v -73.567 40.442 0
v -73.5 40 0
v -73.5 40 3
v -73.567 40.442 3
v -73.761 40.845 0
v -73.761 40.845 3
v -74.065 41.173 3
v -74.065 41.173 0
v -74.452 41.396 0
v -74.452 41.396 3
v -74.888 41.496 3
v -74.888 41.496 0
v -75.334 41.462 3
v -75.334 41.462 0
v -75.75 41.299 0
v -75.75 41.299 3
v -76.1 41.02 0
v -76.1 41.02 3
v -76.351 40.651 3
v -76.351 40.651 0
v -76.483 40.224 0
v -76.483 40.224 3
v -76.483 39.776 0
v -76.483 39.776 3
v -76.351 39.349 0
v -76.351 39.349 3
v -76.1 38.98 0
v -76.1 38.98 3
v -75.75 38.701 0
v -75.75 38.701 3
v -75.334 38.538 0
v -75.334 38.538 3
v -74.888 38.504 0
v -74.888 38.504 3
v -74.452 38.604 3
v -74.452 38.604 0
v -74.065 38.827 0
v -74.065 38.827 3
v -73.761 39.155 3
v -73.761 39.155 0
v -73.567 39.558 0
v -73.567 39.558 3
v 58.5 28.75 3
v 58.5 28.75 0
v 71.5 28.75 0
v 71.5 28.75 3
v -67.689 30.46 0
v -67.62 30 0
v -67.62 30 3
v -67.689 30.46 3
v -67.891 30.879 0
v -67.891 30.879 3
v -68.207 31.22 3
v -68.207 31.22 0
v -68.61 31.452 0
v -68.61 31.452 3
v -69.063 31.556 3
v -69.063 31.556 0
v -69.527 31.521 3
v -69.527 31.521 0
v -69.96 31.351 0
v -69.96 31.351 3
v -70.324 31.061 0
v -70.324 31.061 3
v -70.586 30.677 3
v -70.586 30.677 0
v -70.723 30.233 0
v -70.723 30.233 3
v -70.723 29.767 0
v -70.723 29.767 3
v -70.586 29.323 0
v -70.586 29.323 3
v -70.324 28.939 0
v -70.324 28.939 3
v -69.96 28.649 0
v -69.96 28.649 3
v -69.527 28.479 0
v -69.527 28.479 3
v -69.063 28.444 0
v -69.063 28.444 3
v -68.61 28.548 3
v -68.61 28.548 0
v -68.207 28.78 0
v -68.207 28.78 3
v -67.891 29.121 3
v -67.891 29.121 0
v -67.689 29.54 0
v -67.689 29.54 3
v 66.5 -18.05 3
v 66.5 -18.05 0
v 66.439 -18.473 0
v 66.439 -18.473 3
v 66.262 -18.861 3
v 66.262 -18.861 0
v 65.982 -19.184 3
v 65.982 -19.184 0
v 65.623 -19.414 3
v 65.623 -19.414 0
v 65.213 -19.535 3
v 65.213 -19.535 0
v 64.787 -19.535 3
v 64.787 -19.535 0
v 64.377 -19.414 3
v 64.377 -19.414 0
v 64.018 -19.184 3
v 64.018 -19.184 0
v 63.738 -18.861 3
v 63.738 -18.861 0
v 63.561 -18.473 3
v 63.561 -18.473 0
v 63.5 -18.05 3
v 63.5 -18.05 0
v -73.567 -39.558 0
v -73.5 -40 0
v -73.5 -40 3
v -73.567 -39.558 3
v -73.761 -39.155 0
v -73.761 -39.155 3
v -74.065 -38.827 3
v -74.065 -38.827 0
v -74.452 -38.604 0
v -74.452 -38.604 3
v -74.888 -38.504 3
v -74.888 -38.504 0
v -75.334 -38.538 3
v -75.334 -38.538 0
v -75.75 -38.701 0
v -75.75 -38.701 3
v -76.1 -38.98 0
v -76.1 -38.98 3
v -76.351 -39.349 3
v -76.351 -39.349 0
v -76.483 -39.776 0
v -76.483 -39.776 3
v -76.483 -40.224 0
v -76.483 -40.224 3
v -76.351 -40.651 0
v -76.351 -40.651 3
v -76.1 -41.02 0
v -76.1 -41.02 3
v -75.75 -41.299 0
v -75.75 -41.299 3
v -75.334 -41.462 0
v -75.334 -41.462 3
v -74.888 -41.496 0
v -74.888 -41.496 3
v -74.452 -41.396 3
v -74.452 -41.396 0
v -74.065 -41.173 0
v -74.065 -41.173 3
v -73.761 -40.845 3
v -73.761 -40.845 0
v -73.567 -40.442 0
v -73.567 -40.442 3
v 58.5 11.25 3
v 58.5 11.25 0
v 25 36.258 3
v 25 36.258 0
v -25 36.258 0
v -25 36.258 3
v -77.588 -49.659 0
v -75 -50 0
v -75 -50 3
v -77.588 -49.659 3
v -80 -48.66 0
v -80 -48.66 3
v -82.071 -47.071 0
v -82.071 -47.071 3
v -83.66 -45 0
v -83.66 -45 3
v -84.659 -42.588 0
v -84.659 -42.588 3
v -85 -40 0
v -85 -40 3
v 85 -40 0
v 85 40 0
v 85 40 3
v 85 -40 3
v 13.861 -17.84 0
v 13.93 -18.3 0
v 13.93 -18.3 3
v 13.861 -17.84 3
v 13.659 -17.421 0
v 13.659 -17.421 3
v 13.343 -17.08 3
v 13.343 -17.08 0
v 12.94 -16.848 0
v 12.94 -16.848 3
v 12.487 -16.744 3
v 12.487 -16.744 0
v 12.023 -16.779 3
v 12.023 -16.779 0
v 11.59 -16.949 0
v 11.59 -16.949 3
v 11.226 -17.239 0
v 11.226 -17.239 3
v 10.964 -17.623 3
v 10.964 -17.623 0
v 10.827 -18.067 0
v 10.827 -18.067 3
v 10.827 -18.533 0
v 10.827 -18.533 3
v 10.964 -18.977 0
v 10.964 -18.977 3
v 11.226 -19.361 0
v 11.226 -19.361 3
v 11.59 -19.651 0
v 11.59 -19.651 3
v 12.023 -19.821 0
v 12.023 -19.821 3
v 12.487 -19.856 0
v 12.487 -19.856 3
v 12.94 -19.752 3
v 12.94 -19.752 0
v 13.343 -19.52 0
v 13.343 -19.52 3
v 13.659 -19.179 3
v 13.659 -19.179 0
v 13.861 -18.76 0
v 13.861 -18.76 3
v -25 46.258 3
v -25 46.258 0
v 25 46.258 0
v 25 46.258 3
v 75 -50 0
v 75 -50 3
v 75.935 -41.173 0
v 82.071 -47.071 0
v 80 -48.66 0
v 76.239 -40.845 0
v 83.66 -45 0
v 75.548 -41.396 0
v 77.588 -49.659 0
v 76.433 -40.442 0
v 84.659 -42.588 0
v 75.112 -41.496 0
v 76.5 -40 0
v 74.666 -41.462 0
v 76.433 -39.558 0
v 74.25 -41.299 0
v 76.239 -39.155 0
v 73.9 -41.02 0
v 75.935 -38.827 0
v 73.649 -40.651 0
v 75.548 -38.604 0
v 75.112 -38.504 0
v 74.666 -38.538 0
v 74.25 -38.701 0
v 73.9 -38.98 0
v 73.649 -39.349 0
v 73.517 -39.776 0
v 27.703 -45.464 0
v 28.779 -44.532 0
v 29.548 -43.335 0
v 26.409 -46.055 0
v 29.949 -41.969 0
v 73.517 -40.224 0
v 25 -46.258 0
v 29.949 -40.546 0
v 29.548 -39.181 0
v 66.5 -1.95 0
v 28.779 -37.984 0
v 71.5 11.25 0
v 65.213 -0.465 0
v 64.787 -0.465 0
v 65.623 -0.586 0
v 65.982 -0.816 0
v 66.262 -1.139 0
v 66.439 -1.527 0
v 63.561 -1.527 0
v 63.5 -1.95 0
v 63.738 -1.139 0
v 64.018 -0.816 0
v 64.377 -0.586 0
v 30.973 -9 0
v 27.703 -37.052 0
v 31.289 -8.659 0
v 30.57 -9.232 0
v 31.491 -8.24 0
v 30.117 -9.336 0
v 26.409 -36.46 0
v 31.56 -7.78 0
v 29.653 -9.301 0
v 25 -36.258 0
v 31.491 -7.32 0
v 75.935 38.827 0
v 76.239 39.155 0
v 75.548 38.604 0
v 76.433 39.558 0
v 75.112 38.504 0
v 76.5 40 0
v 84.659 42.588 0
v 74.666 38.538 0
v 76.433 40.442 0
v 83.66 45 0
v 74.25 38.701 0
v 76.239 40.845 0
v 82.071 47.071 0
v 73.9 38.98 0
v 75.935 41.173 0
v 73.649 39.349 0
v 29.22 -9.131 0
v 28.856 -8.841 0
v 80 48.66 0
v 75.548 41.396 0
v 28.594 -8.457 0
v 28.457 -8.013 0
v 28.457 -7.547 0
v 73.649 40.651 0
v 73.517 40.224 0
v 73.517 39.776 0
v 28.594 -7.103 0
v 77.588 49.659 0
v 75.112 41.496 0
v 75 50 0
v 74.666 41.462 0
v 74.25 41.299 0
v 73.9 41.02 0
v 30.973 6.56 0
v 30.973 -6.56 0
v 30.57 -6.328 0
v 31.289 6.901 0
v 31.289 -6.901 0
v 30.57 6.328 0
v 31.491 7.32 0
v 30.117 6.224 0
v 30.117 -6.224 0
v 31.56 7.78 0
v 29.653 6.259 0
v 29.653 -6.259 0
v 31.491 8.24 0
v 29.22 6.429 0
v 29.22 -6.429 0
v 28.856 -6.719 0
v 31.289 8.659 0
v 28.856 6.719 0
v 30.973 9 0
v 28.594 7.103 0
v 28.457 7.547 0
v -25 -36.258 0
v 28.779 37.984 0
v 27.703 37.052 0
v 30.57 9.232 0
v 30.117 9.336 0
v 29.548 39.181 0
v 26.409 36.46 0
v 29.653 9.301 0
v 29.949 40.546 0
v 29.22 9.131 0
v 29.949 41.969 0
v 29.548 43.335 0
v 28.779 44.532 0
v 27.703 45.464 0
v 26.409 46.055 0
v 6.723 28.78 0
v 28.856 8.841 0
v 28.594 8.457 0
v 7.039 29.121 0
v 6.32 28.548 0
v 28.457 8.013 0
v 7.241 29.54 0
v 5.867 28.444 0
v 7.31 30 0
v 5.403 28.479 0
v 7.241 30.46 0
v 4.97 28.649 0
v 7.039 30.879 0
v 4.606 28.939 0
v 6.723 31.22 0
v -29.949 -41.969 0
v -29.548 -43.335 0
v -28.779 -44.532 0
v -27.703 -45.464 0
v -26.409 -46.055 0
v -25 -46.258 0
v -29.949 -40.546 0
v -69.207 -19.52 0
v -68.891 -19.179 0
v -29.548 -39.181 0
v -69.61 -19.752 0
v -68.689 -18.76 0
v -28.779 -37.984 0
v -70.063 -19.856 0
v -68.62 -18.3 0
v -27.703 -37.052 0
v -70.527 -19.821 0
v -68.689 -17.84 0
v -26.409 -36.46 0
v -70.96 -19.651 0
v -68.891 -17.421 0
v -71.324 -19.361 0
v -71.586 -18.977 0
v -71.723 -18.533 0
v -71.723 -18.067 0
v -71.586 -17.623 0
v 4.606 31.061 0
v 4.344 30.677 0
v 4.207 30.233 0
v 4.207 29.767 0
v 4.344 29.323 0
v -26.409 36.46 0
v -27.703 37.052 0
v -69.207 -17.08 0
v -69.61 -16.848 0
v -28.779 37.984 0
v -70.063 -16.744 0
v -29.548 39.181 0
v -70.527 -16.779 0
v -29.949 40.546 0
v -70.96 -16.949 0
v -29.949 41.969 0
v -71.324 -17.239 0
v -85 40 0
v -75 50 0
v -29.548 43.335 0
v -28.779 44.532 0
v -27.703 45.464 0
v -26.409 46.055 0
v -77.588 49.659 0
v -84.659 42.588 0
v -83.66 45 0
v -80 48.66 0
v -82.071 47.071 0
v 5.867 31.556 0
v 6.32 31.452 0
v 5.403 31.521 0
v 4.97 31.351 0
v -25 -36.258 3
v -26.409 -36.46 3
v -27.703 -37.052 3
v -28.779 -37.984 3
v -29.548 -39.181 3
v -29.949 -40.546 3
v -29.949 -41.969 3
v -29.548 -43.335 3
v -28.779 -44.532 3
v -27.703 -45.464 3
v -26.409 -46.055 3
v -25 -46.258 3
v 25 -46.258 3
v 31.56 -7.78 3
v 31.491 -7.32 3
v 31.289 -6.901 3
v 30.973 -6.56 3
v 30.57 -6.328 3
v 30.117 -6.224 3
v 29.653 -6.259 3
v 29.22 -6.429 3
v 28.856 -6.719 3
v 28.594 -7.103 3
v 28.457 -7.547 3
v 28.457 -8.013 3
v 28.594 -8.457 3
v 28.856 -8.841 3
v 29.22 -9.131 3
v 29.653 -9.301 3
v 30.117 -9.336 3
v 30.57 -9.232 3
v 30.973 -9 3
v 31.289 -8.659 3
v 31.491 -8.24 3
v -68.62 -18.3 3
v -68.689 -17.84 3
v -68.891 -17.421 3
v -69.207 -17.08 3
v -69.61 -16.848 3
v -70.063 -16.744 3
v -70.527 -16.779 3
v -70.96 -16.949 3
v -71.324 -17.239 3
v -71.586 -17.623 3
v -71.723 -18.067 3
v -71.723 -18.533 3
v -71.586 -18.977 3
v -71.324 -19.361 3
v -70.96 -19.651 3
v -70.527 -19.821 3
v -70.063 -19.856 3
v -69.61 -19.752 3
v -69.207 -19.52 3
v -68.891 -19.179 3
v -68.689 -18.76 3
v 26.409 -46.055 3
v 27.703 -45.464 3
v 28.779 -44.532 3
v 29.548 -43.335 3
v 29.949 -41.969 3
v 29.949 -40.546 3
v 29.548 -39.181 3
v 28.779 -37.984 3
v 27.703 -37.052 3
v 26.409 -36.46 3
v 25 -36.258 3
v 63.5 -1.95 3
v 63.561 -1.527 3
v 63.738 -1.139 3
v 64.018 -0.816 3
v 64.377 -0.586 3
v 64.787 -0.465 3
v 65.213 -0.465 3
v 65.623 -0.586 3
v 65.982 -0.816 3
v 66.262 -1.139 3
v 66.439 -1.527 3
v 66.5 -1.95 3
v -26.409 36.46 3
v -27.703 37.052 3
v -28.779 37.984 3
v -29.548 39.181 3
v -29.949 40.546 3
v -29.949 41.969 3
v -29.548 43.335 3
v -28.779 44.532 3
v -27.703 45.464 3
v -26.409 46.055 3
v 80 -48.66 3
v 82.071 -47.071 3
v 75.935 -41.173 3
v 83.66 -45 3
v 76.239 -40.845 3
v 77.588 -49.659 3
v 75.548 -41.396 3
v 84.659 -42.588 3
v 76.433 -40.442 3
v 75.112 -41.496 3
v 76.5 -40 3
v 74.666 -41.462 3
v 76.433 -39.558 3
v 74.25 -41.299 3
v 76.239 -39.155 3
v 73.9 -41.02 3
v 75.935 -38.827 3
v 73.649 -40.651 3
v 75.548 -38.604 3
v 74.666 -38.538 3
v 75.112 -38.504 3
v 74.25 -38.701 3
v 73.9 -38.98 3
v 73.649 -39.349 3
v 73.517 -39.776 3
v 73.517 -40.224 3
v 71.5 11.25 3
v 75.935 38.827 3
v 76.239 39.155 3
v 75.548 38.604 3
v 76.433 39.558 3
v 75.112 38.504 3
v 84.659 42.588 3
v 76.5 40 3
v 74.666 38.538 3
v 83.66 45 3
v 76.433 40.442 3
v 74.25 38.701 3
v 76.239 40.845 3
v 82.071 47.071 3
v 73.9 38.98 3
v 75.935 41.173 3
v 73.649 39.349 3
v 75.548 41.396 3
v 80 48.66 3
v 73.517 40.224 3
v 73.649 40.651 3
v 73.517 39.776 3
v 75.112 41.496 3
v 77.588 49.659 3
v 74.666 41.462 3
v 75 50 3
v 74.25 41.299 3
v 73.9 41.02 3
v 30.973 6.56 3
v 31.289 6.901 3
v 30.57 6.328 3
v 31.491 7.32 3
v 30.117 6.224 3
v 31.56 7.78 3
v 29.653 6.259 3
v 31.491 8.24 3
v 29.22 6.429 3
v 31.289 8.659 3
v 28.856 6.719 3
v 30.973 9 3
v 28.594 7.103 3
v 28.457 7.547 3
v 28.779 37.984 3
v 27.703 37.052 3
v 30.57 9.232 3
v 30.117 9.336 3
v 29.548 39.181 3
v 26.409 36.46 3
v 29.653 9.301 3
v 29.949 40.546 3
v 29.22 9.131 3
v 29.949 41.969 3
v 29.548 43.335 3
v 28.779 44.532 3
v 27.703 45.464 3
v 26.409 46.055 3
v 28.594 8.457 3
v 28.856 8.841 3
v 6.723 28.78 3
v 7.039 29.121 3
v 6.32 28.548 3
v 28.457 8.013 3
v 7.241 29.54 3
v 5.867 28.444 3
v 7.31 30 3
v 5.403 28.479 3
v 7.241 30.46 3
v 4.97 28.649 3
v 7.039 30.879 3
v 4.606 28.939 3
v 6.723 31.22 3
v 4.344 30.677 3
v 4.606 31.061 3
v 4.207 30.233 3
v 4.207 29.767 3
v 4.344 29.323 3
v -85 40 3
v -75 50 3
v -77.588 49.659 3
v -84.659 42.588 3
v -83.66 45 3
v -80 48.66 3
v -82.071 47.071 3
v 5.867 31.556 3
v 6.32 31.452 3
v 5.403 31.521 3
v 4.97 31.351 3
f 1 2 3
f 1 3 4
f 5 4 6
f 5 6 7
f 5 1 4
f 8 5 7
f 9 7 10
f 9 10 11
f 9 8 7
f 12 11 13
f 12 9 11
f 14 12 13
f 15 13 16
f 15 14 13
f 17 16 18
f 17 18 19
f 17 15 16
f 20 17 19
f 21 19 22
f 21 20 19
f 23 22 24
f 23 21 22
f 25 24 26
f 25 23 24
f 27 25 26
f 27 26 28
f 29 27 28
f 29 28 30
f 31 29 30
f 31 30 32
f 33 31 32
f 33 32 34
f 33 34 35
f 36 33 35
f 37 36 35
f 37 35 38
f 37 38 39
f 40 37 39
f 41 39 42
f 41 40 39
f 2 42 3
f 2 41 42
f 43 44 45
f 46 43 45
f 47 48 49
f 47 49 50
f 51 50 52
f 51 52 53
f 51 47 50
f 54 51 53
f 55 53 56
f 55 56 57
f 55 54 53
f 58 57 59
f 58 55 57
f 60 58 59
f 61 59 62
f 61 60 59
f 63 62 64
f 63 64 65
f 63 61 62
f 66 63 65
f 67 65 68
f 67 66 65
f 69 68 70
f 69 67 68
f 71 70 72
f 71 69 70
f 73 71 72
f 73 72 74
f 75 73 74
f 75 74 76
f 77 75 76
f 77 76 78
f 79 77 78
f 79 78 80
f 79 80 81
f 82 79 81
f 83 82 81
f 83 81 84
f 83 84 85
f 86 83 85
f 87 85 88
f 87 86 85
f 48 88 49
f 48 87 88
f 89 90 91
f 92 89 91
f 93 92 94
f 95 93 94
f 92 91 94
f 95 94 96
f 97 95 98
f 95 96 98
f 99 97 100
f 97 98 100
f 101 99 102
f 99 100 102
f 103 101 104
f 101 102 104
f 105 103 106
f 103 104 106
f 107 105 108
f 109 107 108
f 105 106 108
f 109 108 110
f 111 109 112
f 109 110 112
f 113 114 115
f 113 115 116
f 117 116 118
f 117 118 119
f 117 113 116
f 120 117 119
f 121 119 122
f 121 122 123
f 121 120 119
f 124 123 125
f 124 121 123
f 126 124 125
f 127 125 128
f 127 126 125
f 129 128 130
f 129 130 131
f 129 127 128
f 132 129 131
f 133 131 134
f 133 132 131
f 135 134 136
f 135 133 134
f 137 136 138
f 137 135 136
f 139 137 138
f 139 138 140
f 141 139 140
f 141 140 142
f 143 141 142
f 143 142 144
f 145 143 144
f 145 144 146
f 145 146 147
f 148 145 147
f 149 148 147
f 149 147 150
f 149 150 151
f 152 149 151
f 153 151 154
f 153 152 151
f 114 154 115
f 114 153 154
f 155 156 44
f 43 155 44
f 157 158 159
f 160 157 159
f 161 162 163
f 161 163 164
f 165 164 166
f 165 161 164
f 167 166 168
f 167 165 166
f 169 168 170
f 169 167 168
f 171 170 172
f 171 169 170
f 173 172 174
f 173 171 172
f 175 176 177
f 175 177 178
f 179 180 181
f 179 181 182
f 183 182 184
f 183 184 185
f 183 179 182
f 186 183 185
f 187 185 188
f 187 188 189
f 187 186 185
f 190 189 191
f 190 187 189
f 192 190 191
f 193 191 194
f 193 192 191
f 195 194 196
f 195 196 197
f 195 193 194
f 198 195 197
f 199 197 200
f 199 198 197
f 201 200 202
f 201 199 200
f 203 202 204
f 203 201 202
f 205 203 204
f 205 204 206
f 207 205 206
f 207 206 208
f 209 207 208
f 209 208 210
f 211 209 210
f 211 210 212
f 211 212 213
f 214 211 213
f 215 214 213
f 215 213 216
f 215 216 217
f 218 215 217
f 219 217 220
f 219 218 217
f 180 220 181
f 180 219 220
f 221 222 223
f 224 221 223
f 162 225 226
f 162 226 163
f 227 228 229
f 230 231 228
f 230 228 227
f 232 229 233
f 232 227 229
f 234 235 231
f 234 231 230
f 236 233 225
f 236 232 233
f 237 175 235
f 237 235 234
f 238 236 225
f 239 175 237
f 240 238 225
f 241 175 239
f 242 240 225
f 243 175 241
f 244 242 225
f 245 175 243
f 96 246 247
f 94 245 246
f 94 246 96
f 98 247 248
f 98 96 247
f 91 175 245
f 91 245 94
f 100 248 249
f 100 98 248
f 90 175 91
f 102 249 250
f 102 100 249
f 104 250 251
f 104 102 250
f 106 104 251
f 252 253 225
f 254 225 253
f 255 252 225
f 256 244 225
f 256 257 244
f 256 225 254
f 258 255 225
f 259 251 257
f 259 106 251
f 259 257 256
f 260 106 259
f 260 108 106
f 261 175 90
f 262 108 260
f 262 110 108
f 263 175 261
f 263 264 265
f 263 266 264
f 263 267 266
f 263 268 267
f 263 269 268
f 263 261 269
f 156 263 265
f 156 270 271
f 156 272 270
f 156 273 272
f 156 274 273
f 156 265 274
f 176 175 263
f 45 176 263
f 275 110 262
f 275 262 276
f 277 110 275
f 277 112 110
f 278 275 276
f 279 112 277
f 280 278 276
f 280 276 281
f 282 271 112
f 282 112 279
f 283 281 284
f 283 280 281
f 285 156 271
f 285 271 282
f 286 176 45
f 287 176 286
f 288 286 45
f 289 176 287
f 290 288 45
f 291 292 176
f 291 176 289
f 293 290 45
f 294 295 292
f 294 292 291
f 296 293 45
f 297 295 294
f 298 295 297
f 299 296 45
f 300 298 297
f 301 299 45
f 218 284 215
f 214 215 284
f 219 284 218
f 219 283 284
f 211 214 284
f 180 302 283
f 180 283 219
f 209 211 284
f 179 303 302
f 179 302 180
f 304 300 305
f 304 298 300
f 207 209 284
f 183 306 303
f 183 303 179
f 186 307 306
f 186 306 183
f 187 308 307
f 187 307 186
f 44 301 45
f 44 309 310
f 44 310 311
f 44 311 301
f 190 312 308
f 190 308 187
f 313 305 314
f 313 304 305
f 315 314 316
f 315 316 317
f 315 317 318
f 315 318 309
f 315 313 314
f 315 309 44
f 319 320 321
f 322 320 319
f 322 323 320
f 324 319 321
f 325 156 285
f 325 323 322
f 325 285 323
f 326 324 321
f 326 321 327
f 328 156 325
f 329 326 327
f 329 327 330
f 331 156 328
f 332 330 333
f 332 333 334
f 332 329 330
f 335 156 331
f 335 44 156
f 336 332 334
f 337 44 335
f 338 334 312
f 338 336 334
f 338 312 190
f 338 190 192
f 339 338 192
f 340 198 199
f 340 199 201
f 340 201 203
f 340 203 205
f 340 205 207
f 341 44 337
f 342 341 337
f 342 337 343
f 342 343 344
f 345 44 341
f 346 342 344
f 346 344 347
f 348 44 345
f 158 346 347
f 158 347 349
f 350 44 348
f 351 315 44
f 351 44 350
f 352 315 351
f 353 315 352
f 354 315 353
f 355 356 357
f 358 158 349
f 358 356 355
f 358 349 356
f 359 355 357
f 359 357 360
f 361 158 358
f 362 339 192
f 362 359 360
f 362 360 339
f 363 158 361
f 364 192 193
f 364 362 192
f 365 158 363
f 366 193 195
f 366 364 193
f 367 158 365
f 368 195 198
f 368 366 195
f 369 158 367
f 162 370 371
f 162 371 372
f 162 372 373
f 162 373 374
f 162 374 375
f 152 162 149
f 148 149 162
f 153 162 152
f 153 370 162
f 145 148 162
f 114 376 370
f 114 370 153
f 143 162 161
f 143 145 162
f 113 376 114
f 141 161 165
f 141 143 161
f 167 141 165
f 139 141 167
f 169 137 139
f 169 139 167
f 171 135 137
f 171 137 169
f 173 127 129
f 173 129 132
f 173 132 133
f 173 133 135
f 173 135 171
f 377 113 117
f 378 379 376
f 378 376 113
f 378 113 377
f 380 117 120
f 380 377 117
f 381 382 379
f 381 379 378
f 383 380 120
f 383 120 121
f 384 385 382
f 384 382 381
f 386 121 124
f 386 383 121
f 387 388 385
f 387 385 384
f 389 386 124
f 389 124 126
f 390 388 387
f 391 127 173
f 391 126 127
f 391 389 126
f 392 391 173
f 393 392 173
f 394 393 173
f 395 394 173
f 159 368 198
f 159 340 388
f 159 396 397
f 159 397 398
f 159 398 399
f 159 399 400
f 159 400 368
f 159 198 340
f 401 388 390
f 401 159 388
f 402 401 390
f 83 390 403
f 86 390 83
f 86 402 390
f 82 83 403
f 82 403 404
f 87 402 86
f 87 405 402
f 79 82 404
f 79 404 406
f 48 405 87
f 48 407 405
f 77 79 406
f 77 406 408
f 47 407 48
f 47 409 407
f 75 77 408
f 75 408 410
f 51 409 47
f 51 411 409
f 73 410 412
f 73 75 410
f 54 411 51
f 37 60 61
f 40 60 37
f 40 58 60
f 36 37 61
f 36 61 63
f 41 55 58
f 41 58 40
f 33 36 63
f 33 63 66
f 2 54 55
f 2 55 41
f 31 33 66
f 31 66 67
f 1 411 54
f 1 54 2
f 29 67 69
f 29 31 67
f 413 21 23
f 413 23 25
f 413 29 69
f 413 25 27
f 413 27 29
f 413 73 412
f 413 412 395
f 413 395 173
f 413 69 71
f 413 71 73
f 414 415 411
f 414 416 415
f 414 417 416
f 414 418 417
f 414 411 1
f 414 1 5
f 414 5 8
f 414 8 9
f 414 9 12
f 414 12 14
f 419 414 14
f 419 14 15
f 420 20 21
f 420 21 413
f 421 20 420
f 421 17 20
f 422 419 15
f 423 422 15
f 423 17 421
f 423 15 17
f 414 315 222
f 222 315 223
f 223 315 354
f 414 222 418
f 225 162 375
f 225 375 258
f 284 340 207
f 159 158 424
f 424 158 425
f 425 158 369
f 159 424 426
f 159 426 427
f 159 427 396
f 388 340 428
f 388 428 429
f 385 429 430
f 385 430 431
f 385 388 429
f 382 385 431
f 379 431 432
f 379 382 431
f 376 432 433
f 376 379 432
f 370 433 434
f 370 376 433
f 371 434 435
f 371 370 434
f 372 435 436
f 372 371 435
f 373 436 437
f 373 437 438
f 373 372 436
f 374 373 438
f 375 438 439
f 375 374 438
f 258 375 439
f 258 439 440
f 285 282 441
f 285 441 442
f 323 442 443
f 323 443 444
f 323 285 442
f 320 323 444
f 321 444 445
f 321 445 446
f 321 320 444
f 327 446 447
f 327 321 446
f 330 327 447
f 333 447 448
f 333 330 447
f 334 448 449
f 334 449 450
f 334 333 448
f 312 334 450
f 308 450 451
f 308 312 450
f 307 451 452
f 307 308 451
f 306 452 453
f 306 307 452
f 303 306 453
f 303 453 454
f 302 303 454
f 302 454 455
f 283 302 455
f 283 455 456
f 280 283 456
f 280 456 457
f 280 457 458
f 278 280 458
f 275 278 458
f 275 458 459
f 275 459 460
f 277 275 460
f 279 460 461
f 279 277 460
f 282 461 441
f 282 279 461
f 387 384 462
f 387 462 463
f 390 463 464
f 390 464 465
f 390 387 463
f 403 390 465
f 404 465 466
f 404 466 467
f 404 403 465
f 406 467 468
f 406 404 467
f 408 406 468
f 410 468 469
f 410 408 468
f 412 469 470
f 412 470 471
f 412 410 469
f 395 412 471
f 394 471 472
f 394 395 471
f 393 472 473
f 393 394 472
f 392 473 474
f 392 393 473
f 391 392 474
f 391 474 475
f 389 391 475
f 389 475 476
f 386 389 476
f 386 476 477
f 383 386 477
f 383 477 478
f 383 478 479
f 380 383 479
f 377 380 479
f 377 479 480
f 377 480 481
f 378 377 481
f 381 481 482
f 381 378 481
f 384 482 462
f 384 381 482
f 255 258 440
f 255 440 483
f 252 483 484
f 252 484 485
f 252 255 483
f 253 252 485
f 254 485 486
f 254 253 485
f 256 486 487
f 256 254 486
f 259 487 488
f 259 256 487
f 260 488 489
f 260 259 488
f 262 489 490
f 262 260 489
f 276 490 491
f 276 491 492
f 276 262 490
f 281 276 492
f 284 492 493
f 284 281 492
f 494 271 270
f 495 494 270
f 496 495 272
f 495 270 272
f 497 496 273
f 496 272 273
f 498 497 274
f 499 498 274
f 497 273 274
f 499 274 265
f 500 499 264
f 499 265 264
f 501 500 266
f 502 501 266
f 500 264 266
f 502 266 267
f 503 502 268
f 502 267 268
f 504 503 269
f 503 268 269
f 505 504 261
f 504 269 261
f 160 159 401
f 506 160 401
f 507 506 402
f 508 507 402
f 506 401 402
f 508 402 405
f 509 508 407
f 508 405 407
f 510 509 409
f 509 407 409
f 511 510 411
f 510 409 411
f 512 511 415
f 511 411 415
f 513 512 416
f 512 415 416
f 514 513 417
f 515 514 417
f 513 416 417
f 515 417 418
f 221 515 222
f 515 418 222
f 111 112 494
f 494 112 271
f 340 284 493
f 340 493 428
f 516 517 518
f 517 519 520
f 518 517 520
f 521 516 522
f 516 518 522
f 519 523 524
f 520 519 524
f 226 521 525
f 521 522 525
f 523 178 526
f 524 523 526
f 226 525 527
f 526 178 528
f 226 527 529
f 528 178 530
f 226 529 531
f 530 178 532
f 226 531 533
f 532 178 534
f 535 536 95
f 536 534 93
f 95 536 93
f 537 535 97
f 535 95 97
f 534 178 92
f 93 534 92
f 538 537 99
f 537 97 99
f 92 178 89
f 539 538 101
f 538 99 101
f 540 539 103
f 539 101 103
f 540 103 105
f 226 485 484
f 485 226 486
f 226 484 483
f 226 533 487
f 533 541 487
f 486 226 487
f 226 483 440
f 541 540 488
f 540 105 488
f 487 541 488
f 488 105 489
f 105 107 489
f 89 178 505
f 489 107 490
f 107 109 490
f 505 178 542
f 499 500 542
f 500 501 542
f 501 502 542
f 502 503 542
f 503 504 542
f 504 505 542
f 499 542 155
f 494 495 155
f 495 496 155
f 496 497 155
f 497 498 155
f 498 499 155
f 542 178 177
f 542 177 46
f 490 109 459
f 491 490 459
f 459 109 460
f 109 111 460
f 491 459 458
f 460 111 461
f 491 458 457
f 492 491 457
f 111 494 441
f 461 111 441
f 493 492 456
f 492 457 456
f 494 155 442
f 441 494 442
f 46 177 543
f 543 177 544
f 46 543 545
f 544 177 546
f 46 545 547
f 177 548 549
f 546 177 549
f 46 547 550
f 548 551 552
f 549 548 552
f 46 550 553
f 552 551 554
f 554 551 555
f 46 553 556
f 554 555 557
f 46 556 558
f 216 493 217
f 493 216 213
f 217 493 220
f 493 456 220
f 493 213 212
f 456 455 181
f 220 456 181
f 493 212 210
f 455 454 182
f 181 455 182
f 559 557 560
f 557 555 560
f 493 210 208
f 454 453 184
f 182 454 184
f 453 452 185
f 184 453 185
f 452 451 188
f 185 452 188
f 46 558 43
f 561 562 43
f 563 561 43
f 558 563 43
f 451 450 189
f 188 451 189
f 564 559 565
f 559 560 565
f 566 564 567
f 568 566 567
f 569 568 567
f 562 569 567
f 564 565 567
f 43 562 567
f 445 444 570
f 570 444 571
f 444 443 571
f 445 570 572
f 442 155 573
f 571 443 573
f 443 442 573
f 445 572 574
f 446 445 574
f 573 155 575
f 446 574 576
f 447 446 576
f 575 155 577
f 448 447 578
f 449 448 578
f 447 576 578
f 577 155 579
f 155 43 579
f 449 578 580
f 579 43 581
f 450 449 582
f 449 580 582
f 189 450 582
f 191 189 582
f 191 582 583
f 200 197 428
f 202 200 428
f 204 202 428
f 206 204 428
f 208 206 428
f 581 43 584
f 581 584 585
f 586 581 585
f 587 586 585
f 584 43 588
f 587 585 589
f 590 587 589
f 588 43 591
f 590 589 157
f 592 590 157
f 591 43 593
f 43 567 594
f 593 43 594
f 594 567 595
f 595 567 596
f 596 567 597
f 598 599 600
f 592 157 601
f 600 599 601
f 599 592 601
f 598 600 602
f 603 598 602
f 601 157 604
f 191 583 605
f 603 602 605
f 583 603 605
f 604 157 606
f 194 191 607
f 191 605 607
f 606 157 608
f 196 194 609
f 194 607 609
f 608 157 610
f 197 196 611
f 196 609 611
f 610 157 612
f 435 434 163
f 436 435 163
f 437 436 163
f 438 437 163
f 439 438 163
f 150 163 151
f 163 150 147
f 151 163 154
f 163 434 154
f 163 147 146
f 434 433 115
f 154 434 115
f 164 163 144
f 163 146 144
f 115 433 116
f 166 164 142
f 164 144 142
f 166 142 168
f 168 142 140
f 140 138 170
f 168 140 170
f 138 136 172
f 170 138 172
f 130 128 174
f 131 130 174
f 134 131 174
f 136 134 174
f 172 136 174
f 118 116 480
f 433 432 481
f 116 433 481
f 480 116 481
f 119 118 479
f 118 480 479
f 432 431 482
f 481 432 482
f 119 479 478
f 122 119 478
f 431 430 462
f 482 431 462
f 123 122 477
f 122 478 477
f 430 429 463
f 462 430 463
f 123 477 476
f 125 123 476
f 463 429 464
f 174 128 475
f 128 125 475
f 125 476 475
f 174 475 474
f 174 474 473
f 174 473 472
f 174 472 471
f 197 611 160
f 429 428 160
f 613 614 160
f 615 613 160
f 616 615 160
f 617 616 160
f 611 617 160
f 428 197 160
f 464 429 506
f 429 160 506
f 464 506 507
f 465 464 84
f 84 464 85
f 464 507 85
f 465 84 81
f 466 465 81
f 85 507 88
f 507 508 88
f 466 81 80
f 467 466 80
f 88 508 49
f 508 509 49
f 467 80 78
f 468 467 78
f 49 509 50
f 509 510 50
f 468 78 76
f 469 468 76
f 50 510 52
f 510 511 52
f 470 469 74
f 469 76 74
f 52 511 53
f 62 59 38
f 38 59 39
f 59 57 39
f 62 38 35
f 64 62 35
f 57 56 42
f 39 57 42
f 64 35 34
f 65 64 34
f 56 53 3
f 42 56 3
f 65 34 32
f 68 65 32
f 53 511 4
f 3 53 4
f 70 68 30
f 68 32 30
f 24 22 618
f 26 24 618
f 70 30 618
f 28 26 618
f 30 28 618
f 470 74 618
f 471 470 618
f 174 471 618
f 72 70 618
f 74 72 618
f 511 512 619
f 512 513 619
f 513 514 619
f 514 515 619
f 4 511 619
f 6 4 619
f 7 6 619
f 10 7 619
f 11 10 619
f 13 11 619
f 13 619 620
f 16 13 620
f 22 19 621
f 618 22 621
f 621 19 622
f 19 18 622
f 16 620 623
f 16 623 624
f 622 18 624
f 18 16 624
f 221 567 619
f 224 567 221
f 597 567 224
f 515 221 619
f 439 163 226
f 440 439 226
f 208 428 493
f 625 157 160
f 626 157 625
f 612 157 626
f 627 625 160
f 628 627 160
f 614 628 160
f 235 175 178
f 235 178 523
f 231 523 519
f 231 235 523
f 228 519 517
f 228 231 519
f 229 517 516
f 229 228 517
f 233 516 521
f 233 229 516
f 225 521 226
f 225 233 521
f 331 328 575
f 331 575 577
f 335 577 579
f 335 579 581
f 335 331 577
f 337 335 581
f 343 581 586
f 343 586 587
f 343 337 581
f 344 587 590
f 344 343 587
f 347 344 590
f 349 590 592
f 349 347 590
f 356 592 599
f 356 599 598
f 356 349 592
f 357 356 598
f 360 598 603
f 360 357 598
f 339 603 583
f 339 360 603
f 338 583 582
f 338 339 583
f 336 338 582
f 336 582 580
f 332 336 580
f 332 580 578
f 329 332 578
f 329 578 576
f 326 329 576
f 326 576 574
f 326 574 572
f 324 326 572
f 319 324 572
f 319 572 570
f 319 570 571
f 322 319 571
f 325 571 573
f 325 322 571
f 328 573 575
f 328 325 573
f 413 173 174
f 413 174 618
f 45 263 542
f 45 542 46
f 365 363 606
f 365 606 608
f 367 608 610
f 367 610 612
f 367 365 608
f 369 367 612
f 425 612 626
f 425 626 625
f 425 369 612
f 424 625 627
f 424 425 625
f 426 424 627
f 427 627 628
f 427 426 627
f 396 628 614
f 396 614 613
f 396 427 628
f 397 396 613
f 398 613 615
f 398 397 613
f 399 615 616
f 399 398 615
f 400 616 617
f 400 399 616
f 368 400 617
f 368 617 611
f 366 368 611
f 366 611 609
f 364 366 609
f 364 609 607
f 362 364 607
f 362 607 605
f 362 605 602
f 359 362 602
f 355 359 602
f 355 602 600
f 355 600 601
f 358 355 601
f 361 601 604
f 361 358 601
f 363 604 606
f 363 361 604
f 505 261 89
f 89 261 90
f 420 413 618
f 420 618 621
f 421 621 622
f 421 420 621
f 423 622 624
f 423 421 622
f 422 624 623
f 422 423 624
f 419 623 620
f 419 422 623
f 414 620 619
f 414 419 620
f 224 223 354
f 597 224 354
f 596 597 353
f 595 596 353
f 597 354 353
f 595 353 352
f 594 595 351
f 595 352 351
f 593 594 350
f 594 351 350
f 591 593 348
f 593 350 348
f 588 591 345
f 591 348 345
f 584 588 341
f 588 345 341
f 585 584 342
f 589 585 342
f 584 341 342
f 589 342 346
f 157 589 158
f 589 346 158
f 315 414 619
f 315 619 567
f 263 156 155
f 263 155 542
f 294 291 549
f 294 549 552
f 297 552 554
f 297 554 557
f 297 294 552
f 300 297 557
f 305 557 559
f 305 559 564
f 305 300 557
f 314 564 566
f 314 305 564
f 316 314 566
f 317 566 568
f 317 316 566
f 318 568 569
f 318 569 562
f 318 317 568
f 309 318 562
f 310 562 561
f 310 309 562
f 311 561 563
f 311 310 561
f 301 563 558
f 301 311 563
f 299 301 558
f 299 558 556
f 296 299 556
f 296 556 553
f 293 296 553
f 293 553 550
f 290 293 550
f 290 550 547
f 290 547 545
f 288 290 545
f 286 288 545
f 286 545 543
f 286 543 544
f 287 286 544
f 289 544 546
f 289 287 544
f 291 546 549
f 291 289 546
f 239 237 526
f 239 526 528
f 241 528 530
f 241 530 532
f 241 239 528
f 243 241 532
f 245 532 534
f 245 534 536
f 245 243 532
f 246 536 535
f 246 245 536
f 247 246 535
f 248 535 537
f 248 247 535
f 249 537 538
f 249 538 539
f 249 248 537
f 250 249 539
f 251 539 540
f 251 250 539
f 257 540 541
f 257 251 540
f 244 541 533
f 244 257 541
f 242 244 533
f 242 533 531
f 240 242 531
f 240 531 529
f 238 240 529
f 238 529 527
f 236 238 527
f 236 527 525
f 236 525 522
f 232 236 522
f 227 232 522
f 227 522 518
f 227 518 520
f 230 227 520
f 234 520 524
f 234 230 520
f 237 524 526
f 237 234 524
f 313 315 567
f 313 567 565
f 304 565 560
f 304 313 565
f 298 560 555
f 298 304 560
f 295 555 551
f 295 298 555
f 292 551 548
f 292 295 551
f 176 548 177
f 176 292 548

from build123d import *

# Parameters (mm, degrees)
SKETCH1_R           = 1.5
SKETCH1_R_2         = 1.56
SKETCH1_W           = 13
SKETCH1_H           = 17.5
BOSS_EXTRUDE1_DEPTH = 3


with BuildPart() as part:
    # Sketch1 → Boss-Extrude1 (new body)
    with BuildSketch(Plane.XY):
        with BuildLine():
            Line((-75, 50), (75, 50))
            ThreePointArc((75, 50), (82.071067812, 47.071067812), (85, 40))
            Line((85, 40), (85, -40))
            ThreePointArc((85, -40), (82.071067812, -47.071067812), (75, -50))
            Line((75, -50), (-75, -50))
            ThreePointArc((-75, -50), (-82.071067812, -47.071067812), (-85, -40))
            Line((-85, -40), (-85, 40))
            ThreePointArc((-85, 40), (-82.071067812, 47.071067812), (-75, 50))
        make_face()
        with Locations((-75, 40)):
            Circle(SKETCH1_R, mode=Mode.SUBTRACT)
        with Locations((-75, -40)):
            Circle(SKETCH1_R, mode=Mode.SUBTRACT)
        with Locations((75, -40)):
            Circle(SKETCH1_R, mode=Mode.SUBTRACT)
        with Locations((75, 40)):
            Circle(SKETCH1_R, mode=Mode.SUBTRACT)
        with Locations((-69.18, 30)):
            Circle(SKETCH1_R_2, mode=Mode.SUBTRACT)
        with Locations((5.75, 30)):
            Circle(SKETCH1_R_2, mode=Mode.SUBTRACT)
        with Locations((12.37, -18.3)):
            Circle(SKETCH1_R_2, mode=Mode.SUBTRACT)
        with Locations((-70.18, -18.3)):
            Circle(SKETCH1_R_2, mode=Mode.SUBTRACT)
        with Locations((30, 7.78)):
            Circle(SKETCH1_R_2, mode=Mode.SUBTRACT)
        with Locations((30, -7.78)):
            Circle(SKETCH1_R_2, mode=Mode.SUBTRACT)
        with BuildLine():
            Line((-25, 46.257829906), (25, 46.257829906))
            ThreePointArc((25, 46.257829906), (30, 41.257829906), (25, 36.257829906))
            Line((25, 36.257829906), (-25, 36.257829906))
            ThreePointArc((-25, 36.257829906), (-30, 41.257829906), (-25, 46.257829906))
        make_face(mode=Mode.SUBTRACT)
        with BuildLine():
            Line((-25, -46.257829906), (25, -46.257829906))
            ThreePointArc((25, -46.257829906), (30, -41.257829906), (25, -36.257829906))
            Line((25, -36.257829906), (-25, -36.257829906))
            ThreePointArc((-25, -36.257829906), (-30, -41.257829906), (-25, -46.257829906))
        make_face(mode=Mode.SUBTRACT)
        with Locations((65, 20)):
            Rectangle(SKETCH1_W, SKETCH1_H, mode=Mode.SUBTRACT)
        with BuildLine():
            Line((66.5, -1.95), (66.5, -18.05))
            ThreePointArc((66.5, -18.05), (65, -19.55), (63.5, -18.05))
            Line((63.5, -18.05), (63.5, -1.95))
            ThreePointArc((63.5, -1.95), (65, -0.45), (66.5, -1.95))
        make_face(mode=Mode.SUBTRACT)
    extrude(amount=BOSS_EXTRUDE1_DEPTH)


solid = part.part
